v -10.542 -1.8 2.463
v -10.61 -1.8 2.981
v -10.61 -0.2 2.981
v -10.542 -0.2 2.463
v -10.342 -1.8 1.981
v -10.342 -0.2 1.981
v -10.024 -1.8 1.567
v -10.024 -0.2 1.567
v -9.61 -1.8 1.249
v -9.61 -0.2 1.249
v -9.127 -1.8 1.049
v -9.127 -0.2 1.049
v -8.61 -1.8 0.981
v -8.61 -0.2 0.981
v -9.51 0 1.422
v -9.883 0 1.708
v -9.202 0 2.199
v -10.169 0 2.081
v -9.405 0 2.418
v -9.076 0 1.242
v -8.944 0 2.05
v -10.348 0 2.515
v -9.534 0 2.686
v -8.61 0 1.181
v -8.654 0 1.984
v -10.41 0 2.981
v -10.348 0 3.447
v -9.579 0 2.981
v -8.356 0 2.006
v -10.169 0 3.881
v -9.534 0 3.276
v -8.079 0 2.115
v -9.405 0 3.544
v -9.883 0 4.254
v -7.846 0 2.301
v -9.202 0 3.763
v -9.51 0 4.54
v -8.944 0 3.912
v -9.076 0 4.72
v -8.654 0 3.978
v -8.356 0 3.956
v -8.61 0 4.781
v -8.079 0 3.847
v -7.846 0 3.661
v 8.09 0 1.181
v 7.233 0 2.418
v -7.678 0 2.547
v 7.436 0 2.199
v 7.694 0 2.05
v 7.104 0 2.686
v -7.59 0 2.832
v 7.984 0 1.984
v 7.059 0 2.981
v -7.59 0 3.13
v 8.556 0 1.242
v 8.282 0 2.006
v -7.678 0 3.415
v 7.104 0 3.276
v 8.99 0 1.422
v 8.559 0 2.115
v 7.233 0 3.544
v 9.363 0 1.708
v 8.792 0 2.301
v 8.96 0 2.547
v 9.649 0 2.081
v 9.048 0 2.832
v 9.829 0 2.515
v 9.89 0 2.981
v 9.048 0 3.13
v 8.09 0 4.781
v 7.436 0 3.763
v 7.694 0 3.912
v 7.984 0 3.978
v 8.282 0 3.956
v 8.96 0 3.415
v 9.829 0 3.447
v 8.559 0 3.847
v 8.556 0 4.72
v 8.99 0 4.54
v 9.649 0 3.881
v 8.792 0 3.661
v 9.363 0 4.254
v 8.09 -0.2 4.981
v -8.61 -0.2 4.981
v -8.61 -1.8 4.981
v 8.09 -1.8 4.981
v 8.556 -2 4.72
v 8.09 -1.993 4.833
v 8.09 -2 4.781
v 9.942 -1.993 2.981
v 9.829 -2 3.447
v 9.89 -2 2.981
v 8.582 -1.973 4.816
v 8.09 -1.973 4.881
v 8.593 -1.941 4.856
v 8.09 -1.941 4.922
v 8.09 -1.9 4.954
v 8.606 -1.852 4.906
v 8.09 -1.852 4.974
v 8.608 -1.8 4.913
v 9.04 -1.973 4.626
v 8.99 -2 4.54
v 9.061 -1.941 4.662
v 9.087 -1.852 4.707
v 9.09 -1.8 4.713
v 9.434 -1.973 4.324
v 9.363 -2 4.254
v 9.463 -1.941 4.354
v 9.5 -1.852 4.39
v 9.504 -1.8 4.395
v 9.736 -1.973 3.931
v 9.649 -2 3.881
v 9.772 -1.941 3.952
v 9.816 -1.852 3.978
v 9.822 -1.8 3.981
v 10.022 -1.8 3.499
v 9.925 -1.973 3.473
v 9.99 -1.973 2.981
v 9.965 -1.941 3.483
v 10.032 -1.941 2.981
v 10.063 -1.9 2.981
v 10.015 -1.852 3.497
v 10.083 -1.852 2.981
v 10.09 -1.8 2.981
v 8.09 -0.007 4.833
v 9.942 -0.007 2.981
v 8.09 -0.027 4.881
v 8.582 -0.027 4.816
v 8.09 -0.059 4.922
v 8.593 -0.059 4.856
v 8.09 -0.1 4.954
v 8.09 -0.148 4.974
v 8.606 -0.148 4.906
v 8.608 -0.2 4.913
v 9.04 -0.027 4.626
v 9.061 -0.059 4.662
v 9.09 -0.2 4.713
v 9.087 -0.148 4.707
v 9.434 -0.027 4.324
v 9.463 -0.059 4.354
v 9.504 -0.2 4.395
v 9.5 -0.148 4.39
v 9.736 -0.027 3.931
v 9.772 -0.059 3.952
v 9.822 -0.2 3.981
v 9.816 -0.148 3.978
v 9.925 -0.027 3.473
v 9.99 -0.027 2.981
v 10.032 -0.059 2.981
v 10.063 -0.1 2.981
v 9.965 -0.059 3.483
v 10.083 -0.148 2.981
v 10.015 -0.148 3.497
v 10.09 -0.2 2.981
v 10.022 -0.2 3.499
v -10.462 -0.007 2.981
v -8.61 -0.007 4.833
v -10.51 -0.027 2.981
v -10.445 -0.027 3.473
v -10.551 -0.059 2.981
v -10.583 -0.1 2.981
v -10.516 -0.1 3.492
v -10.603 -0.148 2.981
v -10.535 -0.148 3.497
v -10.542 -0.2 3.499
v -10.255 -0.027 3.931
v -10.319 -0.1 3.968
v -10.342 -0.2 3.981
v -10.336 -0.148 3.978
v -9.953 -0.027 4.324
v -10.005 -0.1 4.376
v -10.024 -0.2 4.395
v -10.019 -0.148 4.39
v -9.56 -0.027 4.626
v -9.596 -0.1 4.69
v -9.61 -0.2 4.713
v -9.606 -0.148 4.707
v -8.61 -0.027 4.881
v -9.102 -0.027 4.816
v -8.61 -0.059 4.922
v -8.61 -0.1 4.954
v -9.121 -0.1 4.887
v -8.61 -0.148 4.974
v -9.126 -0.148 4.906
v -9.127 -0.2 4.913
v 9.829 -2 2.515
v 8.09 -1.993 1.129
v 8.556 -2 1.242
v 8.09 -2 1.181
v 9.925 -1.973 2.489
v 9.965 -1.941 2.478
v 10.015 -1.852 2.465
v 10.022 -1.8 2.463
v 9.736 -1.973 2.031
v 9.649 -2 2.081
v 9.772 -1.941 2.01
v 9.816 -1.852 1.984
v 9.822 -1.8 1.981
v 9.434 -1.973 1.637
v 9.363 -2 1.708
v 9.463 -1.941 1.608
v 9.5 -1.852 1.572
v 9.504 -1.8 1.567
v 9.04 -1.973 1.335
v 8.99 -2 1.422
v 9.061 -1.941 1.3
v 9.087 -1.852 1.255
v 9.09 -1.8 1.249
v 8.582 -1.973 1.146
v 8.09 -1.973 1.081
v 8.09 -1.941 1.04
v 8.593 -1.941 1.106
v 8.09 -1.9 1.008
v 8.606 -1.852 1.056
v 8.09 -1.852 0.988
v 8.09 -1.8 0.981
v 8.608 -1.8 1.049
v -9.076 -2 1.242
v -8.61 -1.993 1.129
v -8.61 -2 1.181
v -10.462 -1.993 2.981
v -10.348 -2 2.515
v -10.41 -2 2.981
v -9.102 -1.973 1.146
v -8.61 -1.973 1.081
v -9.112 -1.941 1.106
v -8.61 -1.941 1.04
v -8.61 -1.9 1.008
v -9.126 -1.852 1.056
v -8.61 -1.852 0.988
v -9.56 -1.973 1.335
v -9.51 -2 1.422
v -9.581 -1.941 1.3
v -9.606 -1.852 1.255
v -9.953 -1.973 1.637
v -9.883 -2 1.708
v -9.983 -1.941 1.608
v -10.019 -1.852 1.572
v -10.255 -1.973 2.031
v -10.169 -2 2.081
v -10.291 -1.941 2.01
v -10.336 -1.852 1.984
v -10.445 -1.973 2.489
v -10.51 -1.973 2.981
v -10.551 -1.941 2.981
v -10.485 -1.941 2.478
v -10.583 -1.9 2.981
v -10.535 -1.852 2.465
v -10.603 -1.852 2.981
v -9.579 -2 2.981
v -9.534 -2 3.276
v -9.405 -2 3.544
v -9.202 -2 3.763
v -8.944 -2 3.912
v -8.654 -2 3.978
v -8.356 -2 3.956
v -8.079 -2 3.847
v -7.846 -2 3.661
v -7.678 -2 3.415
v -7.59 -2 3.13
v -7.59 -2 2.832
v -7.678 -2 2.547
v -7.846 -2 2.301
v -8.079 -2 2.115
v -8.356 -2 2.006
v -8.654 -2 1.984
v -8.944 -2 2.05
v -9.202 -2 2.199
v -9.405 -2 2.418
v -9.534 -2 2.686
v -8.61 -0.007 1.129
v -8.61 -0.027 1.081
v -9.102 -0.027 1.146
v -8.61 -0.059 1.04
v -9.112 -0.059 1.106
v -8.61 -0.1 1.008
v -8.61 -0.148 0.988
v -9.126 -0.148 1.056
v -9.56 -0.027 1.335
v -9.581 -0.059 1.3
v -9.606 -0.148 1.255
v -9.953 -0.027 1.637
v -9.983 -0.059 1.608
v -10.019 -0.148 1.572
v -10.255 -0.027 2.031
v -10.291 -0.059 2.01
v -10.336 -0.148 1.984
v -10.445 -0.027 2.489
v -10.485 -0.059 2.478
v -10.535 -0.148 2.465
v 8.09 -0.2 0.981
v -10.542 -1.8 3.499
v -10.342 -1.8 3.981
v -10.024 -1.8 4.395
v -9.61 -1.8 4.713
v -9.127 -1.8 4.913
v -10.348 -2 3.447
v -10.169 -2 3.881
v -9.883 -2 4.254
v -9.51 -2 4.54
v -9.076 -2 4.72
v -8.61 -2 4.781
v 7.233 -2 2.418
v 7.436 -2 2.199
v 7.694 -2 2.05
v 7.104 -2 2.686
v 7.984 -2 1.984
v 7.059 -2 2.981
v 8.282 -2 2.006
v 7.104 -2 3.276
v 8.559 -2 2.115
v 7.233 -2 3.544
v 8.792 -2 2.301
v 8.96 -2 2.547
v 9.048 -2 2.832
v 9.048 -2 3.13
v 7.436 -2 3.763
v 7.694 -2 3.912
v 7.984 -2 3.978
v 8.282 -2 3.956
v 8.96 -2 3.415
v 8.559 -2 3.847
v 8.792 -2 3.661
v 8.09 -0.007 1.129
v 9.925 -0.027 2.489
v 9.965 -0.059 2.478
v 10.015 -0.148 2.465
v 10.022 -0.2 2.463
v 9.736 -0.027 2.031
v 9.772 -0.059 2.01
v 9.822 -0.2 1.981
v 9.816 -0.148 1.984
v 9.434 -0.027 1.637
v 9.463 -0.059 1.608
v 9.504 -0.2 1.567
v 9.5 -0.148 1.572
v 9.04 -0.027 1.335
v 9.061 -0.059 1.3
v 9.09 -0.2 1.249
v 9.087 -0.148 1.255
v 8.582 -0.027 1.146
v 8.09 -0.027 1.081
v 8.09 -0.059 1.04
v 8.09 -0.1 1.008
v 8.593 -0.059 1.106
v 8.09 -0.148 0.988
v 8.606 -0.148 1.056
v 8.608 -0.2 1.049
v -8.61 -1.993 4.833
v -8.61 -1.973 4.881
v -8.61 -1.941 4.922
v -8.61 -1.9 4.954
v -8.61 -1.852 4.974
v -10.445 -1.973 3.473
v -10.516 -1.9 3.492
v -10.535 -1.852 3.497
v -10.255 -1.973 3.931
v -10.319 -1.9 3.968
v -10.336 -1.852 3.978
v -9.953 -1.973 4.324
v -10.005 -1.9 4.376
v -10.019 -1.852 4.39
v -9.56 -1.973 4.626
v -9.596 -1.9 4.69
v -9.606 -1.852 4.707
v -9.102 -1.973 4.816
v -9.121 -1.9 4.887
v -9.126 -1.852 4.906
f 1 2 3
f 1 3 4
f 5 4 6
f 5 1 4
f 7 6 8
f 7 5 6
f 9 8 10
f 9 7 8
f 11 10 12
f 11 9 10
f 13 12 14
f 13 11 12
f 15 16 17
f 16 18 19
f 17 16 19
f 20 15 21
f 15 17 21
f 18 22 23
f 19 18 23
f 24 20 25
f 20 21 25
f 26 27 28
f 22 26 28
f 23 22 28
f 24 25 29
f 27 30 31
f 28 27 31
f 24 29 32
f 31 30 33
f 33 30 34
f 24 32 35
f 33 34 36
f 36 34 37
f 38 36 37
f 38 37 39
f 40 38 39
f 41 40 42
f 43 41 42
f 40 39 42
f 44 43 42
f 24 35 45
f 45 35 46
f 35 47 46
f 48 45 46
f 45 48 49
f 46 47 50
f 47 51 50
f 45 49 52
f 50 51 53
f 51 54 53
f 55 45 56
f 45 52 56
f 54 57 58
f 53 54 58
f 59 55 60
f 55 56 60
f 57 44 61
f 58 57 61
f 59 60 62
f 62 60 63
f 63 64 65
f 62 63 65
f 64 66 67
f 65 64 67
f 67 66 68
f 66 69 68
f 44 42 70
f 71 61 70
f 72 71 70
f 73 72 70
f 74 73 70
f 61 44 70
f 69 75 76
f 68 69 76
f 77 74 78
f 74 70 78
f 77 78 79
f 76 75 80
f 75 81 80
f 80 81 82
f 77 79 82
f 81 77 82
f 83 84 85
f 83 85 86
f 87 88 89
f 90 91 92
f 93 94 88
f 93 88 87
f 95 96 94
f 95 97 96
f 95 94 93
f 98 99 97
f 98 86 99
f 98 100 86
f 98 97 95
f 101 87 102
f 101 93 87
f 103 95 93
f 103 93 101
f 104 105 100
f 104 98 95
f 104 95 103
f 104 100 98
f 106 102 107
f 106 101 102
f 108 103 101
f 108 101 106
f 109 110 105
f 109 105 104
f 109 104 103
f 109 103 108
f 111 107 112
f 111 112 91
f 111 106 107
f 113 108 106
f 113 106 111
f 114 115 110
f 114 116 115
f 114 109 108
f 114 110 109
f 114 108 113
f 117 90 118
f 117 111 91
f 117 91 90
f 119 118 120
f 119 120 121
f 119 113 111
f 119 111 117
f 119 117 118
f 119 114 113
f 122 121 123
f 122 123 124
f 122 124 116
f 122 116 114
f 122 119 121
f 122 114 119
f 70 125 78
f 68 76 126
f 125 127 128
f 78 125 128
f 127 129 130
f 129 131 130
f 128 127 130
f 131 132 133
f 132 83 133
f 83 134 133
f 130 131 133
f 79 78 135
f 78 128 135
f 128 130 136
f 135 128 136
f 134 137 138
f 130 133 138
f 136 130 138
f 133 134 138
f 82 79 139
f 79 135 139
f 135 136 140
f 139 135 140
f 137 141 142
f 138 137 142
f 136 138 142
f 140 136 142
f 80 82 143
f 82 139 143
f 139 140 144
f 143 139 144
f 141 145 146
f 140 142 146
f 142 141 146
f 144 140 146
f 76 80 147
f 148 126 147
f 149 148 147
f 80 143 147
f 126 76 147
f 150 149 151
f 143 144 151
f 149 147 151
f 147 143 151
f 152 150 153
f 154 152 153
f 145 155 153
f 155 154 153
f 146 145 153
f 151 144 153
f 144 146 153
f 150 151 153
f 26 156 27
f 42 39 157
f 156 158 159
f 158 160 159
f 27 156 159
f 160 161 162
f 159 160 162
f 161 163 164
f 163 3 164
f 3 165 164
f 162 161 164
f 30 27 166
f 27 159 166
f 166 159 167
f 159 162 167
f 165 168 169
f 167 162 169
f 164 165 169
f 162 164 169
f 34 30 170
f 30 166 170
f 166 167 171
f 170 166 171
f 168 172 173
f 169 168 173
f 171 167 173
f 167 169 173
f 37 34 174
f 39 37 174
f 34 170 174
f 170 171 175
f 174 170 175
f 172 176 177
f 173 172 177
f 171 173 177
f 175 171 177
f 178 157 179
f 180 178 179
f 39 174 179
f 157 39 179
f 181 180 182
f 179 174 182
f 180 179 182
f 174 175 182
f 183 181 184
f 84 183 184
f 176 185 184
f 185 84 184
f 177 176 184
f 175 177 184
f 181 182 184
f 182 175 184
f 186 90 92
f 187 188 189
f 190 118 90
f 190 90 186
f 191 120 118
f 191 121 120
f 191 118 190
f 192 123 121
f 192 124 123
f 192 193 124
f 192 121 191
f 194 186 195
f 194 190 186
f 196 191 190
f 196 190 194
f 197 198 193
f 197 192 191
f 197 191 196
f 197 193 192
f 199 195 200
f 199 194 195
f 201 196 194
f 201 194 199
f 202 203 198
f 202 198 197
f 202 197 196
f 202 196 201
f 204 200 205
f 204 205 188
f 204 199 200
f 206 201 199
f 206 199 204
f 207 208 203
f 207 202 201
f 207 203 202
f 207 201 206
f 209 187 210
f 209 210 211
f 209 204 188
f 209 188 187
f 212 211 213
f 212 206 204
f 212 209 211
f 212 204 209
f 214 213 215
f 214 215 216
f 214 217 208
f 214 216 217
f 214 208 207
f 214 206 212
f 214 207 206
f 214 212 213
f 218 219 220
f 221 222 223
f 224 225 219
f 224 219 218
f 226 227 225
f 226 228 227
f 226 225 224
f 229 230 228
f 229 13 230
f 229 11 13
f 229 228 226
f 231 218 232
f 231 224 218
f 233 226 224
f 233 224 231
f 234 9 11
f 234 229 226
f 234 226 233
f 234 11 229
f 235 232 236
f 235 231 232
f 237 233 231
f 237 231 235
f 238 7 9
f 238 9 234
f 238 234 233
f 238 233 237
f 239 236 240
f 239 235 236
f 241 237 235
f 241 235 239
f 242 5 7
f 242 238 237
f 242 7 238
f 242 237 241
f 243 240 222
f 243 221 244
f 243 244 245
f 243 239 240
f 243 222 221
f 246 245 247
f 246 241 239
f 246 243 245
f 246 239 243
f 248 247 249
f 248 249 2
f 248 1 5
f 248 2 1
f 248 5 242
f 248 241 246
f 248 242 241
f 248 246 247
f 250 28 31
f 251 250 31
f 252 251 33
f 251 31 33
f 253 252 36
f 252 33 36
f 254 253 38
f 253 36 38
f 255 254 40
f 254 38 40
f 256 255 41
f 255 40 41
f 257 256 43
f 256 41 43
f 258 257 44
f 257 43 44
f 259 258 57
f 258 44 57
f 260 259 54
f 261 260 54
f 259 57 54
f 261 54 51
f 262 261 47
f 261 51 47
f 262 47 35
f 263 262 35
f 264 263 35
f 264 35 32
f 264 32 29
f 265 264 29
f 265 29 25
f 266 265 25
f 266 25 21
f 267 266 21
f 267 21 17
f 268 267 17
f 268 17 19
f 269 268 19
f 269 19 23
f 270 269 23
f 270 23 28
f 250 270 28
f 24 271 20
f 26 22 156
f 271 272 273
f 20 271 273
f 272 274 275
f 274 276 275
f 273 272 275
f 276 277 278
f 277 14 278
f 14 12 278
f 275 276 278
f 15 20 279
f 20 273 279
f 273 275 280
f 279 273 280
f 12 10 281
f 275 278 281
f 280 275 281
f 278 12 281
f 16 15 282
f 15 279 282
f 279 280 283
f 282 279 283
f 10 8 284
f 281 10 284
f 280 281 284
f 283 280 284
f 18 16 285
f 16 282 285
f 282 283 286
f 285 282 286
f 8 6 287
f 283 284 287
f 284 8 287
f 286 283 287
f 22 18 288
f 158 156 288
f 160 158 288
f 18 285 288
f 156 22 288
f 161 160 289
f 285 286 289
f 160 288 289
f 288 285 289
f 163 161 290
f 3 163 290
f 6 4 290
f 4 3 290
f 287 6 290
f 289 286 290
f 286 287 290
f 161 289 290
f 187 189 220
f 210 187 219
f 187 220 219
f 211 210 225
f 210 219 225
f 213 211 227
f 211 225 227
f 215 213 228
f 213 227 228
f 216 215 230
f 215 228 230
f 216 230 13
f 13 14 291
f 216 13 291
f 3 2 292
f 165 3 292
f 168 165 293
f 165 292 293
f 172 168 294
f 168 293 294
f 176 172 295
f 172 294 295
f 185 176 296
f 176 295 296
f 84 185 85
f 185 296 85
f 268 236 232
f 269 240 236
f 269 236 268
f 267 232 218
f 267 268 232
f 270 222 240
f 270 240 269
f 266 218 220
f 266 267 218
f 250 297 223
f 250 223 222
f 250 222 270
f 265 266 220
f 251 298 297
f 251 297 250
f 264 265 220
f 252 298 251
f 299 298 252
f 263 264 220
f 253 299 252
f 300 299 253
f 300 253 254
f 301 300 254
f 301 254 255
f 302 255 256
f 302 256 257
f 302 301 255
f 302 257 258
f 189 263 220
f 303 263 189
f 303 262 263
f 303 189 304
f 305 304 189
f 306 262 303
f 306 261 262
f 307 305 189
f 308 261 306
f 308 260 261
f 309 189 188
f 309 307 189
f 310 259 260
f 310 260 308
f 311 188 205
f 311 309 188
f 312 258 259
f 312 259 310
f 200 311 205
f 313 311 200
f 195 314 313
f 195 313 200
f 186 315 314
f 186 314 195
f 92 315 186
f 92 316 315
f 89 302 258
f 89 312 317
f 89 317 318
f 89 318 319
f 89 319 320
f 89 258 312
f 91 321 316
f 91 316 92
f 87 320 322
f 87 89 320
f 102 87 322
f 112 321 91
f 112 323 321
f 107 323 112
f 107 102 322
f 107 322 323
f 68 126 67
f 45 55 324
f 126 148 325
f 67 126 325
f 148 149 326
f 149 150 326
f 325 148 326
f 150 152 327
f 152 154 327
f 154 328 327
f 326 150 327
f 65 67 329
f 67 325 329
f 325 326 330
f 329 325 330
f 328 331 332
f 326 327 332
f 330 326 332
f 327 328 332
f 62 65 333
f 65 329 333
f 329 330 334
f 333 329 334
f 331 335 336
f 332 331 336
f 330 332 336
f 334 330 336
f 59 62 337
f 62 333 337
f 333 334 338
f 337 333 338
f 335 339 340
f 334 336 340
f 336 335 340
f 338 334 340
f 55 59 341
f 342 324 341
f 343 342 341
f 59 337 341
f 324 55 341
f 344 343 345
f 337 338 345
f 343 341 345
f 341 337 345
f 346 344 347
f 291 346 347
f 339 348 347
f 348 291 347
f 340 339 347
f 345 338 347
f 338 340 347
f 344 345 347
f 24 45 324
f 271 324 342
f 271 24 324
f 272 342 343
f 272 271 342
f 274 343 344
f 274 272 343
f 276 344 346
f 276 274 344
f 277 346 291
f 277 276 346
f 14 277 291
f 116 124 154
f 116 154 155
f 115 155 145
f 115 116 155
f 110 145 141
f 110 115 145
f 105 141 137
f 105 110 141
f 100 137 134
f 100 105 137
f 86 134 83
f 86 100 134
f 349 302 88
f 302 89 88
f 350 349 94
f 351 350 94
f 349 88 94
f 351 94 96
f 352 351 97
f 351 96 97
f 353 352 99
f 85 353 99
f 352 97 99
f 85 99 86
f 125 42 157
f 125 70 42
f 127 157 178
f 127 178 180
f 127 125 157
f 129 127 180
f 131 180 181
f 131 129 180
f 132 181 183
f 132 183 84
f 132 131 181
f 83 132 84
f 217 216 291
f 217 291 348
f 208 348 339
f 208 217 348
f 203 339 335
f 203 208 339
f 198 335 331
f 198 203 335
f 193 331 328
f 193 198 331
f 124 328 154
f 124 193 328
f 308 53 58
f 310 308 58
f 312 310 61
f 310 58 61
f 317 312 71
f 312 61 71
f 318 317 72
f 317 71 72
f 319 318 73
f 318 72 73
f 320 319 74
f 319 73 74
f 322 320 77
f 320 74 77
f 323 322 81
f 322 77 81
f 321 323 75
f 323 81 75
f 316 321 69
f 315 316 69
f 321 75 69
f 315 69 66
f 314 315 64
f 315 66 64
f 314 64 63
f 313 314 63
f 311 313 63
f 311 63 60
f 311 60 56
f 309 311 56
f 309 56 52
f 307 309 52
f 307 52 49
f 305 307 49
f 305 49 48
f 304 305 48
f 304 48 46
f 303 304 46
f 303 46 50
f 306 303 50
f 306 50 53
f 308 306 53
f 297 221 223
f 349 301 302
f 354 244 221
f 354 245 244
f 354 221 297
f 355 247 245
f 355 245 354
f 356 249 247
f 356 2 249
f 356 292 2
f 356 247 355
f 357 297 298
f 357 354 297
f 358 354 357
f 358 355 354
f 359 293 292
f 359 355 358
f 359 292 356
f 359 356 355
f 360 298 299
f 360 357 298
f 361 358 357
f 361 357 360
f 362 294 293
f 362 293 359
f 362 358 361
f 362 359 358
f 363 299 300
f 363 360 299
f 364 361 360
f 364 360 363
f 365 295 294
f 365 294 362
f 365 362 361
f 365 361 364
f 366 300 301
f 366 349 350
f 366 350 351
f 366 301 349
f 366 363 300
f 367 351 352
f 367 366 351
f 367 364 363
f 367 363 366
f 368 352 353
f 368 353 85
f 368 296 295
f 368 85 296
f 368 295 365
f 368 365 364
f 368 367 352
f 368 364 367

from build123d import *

# Parameters (mm, degrees)
F0_W     = 20.7
F0_H     = 4
F1_DEPTH = 2
F2_R     = 1.99999
F3_R     = 0.2
F4_R     = 1
F5_DEPTH = 25


# Not quite as in the source:
# - a fillet or chamfer is up to 0.001 mm smaller than in the source, because OpenCascade refuses the exact size


with BuildPart() as f1:
    # F0 (on Front) → F1 (new body)
    with BuildSketch(Plane.XZ):
        with Locations((-0.2598203719, 2.9809341038)):
            Rectangle(F0_W, F0_H)
    extrude(amount=F1_DEPTH)

    # F2 (radius 2 in the source; OpenCascade refuses exactly that, so slightly less here)
    f2_edges = [f1.edges().sort_by_distance(p)[0] for p in [
        (-10.60982, -1, 4.980934),
        (-10.60982, -1, 0.980934),
        (10.09018, -1, 4.980934),
        (10.09018, -1, 0.980934),
    ]]
    fillet(f2_edges, radius=F2_R)

    # F3
    f3_edges = [f1.edges().sort_by_distance(p)[0] for p in [
        (-0.25982, 0, 4.980934),
        (-0.25982, -2, 4.980934),
    ]]
    fillet(f3_edges, radius=F3_R)

    # F4 (on face) → F5 (cut)
    with BuildSketch(Plane(origin=(0, 0, 0), x_dir=(-1, 0, 0), z_dir=(0, 1, 0))):
        with Locations((8.5788203719, 2.9809341038)):
            Circle(F4_R)
        with Locations((-8.0591796281, 2.9809341038)):
            Circle(F4_R)
    extrude(amount=-F5_DEPTH, mode=Mode.SUBTRACT)


solid = f1.part
